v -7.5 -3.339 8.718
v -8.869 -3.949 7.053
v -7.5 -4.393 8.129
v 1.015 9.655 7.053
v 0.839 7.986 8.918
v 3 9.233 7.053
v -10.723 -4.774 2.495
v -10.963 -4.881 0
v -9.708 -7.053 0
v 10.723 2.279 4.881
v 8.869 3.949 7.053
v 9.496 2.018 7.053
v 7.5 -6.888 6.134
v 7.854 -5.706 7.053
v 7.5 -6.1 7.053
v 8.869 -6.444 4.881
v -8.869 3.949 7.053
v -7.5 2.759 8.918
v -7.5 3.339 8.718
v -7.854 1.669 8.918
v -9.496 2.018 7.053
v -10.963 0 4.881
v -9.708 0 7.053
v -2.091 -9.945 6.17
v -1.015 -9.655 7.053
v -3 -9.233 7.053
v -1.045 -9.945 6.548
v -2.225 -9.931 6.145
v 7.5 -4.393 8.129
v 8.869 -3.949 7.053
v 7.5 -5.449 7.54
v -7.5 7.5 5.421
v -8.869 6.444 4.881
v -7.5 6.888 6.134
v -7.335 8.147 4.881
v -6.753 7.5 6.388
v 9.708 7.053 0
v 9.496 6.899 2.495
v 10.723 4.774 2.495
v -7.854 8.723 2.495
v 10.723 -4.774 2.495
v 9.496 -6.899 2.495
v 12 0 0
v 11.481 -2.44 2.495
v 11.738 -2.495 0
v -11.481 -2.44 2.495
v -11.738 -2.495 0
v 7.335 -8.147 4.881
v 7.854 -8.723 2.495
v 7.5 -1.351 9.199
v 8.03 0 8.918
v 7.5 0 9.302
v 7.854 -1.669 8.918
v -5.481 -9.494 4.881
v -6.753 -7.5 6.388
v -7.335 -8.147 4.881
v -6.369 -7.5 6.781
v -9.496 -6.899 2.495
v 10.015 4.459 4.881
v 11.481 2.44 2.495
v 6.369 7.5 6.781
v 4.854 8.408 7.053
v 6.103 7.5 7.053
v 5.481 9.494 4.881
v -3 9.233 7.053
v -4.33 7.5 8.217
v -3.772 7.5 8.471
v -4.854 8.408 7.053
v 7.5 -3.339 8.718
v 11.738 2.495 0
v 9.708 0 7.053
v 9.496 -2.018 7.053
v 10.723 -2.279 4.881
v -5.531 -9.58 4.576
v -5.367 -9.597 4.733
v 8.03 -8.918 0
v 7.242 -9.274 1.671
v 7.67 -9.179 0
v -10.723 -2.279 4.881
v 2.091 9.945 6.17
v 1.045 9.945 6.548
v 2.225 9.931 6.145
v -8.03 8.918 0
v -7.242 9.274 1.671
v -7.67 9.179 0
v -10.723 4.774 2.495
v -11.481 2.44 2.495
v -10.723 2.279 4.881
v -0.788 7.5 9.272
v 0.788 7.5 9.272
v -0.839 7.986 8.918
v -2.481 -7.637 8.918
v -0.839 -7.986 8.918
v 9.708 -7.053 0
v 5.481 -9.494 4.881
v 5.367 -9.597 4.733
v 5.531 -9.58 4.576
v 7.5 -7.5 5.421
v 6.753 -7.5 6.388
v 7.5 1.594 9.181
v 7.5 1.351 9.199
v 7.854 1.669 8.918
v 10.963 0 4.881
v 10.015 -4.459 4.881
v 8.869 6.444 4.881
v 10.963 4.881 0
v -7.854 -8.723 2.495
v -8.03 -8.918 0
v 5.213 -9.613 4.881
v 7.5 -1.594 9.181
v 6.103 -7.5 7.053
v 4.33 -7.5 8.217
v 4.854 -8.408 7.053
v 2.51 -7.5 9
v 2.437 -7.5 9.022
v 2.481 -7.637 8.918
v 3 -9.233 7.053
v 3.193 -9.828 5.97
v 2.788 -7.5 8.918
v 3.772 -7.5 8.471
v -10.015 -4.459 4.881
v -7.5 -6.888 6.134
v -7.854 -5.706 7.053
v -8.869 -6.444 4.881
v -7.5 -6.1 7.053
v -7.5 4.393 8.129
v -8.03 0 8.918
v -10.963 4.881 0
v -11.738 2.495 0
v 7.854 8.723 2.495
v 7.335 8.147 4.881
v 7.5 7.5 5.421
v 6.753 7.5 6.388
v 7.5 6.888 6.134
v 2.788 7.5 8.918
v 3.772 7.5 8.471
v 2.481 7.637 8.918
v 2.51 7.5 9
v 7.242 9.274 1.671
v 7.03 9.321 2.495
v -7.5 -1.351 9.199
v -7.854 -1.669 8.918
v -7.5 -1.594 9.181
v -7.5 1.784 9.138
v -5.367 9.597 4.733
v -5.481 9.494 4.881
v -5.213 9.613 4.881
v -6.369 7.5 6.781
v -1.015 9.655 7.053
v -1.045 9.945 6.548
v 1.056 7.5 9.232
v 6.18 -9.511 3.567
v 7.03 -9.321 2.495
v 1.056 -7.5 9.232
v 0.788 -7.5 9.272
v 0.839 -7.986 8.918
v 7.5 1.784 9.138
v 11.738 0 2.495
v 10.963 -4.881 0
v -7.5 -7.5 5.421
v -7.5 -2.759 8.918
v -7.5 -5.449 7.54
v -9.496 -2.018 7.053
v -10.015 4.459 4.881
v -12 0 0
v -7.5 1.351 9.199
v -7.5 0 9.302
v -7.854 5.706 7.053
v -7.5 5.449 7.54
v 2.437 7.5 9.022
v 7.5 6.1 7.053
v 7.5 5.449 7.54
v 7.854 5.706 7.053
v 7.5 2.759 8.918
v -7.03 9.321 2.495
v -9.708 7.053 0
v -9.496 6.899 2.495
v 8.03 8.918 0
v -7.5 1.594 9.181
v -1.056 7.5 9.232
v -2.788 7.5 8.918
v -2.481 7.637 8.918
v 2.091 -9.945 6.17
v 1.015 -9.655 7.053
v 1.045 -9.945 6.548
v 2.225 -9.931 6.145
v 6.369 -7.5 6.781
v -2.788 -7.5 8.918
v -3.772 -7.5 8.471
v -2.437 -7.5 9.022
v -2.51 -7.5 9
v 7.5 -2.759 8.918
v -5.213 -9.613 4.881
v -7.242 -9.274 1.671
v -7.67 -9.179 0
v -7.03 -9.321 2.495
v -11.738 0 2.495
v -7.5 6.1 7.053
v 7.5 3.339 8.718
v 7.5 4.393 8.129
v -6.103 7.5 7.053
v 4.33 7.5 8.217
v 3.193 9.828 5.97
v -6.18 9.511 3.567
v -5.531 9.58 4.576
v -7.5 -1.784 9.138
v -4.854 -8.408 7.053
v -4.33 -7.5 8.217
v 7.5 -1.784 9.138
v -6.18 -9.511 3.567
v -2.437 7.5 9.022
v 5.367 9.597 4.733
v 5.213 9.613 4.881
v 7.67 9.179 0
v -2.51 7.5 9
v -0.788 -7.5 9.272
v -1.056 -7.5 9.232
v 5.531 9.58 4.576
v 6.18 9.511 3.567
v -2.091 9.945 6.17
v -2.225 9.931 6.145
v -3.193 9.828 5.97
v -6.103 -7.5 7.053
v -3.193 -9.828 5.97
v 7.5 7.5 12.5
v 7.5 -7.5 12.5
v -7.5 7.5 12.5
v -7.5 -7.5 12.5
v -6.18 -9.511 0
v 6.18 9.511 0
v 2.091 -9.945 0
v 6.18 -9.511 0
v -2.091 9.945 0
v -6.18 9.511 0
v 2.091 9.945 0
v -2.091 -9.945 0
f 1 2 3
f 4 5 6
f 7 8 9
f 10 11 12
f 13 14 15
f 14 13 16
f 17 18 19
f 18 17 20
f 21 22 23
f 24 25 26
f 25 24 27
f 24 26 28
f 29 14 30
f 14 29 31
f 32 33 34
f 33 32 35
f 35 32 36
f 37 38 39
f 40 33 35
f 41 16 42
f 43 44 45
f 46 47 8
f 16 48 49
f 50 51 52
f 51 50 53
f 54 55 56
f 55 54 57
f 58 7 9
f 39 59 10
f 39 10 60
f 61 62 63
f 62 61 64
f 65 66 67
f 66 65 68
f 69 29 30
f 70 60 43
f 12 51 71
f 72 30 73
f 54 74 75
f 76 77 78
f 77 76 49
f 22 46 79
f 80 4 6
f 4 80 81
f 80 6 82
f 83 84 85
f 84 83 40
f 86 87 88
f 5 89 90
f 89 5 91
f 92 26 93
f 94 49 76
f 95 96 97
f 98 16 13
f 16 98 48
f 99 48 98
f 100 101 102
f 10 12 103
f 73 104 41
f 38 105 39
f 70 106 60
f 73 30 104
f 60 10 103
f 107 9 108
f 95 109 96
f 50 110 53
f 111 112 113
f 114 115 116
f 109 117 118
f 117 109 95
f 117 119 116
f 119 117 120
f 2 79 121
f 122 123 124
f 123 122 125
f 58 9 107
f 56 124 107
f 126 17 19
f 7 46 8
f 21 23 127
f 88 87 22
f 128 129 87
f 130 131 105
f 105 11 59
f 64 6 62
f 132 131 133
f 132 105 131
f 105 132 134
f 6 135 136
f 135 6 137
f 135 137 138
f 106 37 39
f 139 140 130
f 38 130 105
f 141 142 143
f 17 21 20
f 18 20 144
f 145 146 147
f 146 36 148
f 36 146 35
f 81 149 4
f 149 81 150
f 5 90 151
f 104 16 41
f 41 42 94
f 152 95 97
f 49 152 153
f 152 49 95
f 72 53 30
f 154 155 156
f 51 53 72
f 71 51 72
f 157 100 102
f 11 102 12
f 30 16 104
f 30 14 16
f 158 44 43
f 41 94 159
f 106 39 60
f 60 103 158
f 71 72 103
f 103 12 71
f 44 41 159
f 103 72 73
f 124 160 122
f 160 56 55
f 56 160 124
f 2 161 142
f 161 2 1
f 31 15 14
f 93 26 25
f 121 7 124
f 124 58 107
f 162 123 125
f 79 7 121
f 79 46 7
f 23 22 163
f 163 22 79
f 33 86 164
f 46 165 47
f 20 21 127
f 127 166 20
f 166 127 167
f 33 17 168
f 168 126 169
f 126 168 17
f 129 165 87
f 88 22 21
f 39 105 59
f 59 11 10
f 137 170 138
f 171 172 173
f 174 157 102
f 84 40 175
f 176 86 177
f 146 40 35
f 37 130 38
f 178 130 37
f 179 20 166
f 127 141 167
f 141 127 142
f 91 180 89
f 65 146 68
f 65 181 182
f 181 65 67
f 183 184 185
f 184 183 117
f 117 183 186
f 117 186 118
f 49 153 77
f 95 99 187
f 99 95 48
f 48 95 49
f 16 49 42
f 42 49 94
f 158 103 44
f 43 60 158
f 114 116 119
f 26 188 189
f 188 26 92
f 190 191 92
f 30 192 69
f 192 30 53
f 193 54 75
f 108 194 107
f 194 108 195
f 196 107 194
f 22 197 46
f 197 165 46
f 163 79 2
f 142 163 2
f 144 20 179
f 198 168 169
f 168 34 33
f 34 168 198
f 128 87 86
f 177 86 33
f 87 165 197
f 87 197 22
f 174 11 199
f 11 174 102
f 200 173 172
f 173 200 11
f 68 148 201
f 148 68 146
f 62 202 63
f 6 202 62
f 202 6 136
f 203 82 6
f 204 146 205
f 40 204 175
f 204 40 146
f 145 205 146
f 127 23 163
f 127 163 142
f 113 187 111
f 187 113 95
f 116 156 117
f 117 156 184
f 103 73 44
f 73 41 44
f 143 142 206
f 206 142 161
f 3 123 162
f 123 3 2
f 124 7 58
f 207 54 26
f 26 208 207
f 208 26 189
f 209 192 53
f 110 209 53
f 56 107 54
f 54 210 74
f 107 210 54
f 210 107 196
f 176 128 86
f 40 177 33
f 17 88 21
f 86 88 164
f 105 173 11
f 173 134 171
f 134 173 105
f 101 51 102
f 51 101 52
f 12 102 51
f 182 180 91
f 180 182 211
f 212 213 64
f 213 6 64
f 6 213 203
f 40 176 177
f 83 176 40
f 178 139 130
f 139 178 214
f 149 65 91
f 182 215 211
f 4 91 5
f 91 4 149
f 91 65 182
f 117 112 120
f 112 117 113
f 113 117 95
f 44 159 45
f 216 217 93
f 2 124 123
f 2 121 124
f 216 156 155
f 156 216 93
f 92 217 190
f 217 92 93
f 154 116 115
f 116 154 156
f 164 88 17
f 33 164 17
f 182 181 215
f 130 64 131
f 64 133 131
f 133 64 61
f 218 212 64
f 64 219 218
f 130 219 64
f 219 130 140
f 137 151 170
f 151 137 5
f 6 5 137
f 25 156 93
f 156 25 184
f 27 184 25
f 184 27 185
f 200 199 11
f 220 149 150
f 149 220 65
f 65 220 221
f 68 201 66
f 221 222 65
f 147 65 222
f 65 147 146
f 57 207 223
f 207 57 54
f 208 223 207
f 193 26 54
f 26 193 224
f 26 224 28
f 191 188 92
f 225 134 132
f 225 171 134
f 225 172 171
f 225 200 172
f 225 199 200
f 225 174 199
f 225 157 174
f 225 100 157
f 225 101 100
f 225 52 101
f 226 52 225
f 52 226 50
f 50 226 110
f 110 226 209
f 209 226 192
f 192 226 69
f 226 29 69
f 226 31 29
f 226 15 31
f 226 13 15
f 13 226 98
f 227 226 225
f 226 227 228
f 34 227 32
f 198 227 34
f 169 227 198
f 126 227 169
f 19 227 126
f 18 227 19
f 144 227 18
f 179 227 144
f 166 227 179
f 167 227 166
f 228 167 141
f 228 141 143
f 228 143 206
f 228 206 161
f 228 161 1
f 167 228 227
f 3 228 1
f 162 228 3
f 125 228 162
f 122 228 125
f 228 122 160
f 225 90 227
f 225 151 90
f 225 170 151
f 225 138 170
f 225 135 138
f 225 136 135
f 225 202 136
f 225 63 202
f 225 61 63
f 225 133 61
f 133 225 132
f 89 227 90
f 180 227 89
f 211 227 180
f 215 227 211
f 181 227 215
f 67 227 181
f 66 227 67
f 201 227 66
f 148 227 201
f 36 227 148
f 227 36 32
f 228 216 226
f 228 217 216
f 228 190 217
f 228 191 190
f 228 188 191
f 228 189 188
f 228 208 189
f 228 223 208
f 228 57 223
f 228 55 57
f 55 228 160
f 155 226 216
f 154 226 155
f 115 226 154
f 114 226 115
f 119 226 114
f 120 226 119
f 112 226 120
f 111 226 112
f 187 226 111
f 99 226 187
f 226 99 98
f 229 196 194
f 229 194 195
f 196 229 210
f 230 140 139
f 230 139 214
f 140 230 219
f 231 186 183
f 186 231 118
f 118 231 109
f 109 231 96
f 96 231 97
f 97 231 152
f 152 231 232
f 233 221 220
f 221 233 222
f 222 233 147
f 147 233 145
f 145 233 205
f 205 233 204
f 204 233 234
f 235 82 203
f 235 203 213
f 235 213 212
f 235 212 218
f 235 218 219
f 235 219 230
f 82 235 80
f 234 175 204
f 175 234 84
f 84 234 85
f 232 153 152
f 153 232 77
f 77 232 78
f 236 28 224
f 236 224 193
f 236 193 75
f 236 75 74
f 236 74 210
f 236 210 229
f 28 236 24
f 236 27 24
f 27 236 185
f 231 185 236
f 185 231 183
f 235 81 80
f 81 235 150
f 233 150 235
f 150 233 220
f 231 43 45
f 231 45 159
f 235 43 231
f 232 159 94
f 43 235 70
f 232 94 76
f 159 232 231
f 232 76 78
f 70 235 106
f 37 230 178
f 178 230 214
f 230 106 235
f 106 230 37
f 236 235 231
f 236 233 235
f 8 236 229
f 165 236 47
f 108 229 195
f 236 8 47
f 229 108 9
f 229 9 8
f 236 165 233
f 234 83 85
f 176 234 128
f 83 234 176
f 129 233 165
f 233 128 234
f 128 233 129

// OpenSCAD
// Generated by generate_scads.py
intersection() {
  scale([2.0,1.0,1.0]) {
    cylinder(h=15, r=10, center=false);
  }
  union() {
    sphere(r=12);
    cube(size=[15,15,25], center=true);
  }
  cube(size=[30,30,30], center=true);
}
